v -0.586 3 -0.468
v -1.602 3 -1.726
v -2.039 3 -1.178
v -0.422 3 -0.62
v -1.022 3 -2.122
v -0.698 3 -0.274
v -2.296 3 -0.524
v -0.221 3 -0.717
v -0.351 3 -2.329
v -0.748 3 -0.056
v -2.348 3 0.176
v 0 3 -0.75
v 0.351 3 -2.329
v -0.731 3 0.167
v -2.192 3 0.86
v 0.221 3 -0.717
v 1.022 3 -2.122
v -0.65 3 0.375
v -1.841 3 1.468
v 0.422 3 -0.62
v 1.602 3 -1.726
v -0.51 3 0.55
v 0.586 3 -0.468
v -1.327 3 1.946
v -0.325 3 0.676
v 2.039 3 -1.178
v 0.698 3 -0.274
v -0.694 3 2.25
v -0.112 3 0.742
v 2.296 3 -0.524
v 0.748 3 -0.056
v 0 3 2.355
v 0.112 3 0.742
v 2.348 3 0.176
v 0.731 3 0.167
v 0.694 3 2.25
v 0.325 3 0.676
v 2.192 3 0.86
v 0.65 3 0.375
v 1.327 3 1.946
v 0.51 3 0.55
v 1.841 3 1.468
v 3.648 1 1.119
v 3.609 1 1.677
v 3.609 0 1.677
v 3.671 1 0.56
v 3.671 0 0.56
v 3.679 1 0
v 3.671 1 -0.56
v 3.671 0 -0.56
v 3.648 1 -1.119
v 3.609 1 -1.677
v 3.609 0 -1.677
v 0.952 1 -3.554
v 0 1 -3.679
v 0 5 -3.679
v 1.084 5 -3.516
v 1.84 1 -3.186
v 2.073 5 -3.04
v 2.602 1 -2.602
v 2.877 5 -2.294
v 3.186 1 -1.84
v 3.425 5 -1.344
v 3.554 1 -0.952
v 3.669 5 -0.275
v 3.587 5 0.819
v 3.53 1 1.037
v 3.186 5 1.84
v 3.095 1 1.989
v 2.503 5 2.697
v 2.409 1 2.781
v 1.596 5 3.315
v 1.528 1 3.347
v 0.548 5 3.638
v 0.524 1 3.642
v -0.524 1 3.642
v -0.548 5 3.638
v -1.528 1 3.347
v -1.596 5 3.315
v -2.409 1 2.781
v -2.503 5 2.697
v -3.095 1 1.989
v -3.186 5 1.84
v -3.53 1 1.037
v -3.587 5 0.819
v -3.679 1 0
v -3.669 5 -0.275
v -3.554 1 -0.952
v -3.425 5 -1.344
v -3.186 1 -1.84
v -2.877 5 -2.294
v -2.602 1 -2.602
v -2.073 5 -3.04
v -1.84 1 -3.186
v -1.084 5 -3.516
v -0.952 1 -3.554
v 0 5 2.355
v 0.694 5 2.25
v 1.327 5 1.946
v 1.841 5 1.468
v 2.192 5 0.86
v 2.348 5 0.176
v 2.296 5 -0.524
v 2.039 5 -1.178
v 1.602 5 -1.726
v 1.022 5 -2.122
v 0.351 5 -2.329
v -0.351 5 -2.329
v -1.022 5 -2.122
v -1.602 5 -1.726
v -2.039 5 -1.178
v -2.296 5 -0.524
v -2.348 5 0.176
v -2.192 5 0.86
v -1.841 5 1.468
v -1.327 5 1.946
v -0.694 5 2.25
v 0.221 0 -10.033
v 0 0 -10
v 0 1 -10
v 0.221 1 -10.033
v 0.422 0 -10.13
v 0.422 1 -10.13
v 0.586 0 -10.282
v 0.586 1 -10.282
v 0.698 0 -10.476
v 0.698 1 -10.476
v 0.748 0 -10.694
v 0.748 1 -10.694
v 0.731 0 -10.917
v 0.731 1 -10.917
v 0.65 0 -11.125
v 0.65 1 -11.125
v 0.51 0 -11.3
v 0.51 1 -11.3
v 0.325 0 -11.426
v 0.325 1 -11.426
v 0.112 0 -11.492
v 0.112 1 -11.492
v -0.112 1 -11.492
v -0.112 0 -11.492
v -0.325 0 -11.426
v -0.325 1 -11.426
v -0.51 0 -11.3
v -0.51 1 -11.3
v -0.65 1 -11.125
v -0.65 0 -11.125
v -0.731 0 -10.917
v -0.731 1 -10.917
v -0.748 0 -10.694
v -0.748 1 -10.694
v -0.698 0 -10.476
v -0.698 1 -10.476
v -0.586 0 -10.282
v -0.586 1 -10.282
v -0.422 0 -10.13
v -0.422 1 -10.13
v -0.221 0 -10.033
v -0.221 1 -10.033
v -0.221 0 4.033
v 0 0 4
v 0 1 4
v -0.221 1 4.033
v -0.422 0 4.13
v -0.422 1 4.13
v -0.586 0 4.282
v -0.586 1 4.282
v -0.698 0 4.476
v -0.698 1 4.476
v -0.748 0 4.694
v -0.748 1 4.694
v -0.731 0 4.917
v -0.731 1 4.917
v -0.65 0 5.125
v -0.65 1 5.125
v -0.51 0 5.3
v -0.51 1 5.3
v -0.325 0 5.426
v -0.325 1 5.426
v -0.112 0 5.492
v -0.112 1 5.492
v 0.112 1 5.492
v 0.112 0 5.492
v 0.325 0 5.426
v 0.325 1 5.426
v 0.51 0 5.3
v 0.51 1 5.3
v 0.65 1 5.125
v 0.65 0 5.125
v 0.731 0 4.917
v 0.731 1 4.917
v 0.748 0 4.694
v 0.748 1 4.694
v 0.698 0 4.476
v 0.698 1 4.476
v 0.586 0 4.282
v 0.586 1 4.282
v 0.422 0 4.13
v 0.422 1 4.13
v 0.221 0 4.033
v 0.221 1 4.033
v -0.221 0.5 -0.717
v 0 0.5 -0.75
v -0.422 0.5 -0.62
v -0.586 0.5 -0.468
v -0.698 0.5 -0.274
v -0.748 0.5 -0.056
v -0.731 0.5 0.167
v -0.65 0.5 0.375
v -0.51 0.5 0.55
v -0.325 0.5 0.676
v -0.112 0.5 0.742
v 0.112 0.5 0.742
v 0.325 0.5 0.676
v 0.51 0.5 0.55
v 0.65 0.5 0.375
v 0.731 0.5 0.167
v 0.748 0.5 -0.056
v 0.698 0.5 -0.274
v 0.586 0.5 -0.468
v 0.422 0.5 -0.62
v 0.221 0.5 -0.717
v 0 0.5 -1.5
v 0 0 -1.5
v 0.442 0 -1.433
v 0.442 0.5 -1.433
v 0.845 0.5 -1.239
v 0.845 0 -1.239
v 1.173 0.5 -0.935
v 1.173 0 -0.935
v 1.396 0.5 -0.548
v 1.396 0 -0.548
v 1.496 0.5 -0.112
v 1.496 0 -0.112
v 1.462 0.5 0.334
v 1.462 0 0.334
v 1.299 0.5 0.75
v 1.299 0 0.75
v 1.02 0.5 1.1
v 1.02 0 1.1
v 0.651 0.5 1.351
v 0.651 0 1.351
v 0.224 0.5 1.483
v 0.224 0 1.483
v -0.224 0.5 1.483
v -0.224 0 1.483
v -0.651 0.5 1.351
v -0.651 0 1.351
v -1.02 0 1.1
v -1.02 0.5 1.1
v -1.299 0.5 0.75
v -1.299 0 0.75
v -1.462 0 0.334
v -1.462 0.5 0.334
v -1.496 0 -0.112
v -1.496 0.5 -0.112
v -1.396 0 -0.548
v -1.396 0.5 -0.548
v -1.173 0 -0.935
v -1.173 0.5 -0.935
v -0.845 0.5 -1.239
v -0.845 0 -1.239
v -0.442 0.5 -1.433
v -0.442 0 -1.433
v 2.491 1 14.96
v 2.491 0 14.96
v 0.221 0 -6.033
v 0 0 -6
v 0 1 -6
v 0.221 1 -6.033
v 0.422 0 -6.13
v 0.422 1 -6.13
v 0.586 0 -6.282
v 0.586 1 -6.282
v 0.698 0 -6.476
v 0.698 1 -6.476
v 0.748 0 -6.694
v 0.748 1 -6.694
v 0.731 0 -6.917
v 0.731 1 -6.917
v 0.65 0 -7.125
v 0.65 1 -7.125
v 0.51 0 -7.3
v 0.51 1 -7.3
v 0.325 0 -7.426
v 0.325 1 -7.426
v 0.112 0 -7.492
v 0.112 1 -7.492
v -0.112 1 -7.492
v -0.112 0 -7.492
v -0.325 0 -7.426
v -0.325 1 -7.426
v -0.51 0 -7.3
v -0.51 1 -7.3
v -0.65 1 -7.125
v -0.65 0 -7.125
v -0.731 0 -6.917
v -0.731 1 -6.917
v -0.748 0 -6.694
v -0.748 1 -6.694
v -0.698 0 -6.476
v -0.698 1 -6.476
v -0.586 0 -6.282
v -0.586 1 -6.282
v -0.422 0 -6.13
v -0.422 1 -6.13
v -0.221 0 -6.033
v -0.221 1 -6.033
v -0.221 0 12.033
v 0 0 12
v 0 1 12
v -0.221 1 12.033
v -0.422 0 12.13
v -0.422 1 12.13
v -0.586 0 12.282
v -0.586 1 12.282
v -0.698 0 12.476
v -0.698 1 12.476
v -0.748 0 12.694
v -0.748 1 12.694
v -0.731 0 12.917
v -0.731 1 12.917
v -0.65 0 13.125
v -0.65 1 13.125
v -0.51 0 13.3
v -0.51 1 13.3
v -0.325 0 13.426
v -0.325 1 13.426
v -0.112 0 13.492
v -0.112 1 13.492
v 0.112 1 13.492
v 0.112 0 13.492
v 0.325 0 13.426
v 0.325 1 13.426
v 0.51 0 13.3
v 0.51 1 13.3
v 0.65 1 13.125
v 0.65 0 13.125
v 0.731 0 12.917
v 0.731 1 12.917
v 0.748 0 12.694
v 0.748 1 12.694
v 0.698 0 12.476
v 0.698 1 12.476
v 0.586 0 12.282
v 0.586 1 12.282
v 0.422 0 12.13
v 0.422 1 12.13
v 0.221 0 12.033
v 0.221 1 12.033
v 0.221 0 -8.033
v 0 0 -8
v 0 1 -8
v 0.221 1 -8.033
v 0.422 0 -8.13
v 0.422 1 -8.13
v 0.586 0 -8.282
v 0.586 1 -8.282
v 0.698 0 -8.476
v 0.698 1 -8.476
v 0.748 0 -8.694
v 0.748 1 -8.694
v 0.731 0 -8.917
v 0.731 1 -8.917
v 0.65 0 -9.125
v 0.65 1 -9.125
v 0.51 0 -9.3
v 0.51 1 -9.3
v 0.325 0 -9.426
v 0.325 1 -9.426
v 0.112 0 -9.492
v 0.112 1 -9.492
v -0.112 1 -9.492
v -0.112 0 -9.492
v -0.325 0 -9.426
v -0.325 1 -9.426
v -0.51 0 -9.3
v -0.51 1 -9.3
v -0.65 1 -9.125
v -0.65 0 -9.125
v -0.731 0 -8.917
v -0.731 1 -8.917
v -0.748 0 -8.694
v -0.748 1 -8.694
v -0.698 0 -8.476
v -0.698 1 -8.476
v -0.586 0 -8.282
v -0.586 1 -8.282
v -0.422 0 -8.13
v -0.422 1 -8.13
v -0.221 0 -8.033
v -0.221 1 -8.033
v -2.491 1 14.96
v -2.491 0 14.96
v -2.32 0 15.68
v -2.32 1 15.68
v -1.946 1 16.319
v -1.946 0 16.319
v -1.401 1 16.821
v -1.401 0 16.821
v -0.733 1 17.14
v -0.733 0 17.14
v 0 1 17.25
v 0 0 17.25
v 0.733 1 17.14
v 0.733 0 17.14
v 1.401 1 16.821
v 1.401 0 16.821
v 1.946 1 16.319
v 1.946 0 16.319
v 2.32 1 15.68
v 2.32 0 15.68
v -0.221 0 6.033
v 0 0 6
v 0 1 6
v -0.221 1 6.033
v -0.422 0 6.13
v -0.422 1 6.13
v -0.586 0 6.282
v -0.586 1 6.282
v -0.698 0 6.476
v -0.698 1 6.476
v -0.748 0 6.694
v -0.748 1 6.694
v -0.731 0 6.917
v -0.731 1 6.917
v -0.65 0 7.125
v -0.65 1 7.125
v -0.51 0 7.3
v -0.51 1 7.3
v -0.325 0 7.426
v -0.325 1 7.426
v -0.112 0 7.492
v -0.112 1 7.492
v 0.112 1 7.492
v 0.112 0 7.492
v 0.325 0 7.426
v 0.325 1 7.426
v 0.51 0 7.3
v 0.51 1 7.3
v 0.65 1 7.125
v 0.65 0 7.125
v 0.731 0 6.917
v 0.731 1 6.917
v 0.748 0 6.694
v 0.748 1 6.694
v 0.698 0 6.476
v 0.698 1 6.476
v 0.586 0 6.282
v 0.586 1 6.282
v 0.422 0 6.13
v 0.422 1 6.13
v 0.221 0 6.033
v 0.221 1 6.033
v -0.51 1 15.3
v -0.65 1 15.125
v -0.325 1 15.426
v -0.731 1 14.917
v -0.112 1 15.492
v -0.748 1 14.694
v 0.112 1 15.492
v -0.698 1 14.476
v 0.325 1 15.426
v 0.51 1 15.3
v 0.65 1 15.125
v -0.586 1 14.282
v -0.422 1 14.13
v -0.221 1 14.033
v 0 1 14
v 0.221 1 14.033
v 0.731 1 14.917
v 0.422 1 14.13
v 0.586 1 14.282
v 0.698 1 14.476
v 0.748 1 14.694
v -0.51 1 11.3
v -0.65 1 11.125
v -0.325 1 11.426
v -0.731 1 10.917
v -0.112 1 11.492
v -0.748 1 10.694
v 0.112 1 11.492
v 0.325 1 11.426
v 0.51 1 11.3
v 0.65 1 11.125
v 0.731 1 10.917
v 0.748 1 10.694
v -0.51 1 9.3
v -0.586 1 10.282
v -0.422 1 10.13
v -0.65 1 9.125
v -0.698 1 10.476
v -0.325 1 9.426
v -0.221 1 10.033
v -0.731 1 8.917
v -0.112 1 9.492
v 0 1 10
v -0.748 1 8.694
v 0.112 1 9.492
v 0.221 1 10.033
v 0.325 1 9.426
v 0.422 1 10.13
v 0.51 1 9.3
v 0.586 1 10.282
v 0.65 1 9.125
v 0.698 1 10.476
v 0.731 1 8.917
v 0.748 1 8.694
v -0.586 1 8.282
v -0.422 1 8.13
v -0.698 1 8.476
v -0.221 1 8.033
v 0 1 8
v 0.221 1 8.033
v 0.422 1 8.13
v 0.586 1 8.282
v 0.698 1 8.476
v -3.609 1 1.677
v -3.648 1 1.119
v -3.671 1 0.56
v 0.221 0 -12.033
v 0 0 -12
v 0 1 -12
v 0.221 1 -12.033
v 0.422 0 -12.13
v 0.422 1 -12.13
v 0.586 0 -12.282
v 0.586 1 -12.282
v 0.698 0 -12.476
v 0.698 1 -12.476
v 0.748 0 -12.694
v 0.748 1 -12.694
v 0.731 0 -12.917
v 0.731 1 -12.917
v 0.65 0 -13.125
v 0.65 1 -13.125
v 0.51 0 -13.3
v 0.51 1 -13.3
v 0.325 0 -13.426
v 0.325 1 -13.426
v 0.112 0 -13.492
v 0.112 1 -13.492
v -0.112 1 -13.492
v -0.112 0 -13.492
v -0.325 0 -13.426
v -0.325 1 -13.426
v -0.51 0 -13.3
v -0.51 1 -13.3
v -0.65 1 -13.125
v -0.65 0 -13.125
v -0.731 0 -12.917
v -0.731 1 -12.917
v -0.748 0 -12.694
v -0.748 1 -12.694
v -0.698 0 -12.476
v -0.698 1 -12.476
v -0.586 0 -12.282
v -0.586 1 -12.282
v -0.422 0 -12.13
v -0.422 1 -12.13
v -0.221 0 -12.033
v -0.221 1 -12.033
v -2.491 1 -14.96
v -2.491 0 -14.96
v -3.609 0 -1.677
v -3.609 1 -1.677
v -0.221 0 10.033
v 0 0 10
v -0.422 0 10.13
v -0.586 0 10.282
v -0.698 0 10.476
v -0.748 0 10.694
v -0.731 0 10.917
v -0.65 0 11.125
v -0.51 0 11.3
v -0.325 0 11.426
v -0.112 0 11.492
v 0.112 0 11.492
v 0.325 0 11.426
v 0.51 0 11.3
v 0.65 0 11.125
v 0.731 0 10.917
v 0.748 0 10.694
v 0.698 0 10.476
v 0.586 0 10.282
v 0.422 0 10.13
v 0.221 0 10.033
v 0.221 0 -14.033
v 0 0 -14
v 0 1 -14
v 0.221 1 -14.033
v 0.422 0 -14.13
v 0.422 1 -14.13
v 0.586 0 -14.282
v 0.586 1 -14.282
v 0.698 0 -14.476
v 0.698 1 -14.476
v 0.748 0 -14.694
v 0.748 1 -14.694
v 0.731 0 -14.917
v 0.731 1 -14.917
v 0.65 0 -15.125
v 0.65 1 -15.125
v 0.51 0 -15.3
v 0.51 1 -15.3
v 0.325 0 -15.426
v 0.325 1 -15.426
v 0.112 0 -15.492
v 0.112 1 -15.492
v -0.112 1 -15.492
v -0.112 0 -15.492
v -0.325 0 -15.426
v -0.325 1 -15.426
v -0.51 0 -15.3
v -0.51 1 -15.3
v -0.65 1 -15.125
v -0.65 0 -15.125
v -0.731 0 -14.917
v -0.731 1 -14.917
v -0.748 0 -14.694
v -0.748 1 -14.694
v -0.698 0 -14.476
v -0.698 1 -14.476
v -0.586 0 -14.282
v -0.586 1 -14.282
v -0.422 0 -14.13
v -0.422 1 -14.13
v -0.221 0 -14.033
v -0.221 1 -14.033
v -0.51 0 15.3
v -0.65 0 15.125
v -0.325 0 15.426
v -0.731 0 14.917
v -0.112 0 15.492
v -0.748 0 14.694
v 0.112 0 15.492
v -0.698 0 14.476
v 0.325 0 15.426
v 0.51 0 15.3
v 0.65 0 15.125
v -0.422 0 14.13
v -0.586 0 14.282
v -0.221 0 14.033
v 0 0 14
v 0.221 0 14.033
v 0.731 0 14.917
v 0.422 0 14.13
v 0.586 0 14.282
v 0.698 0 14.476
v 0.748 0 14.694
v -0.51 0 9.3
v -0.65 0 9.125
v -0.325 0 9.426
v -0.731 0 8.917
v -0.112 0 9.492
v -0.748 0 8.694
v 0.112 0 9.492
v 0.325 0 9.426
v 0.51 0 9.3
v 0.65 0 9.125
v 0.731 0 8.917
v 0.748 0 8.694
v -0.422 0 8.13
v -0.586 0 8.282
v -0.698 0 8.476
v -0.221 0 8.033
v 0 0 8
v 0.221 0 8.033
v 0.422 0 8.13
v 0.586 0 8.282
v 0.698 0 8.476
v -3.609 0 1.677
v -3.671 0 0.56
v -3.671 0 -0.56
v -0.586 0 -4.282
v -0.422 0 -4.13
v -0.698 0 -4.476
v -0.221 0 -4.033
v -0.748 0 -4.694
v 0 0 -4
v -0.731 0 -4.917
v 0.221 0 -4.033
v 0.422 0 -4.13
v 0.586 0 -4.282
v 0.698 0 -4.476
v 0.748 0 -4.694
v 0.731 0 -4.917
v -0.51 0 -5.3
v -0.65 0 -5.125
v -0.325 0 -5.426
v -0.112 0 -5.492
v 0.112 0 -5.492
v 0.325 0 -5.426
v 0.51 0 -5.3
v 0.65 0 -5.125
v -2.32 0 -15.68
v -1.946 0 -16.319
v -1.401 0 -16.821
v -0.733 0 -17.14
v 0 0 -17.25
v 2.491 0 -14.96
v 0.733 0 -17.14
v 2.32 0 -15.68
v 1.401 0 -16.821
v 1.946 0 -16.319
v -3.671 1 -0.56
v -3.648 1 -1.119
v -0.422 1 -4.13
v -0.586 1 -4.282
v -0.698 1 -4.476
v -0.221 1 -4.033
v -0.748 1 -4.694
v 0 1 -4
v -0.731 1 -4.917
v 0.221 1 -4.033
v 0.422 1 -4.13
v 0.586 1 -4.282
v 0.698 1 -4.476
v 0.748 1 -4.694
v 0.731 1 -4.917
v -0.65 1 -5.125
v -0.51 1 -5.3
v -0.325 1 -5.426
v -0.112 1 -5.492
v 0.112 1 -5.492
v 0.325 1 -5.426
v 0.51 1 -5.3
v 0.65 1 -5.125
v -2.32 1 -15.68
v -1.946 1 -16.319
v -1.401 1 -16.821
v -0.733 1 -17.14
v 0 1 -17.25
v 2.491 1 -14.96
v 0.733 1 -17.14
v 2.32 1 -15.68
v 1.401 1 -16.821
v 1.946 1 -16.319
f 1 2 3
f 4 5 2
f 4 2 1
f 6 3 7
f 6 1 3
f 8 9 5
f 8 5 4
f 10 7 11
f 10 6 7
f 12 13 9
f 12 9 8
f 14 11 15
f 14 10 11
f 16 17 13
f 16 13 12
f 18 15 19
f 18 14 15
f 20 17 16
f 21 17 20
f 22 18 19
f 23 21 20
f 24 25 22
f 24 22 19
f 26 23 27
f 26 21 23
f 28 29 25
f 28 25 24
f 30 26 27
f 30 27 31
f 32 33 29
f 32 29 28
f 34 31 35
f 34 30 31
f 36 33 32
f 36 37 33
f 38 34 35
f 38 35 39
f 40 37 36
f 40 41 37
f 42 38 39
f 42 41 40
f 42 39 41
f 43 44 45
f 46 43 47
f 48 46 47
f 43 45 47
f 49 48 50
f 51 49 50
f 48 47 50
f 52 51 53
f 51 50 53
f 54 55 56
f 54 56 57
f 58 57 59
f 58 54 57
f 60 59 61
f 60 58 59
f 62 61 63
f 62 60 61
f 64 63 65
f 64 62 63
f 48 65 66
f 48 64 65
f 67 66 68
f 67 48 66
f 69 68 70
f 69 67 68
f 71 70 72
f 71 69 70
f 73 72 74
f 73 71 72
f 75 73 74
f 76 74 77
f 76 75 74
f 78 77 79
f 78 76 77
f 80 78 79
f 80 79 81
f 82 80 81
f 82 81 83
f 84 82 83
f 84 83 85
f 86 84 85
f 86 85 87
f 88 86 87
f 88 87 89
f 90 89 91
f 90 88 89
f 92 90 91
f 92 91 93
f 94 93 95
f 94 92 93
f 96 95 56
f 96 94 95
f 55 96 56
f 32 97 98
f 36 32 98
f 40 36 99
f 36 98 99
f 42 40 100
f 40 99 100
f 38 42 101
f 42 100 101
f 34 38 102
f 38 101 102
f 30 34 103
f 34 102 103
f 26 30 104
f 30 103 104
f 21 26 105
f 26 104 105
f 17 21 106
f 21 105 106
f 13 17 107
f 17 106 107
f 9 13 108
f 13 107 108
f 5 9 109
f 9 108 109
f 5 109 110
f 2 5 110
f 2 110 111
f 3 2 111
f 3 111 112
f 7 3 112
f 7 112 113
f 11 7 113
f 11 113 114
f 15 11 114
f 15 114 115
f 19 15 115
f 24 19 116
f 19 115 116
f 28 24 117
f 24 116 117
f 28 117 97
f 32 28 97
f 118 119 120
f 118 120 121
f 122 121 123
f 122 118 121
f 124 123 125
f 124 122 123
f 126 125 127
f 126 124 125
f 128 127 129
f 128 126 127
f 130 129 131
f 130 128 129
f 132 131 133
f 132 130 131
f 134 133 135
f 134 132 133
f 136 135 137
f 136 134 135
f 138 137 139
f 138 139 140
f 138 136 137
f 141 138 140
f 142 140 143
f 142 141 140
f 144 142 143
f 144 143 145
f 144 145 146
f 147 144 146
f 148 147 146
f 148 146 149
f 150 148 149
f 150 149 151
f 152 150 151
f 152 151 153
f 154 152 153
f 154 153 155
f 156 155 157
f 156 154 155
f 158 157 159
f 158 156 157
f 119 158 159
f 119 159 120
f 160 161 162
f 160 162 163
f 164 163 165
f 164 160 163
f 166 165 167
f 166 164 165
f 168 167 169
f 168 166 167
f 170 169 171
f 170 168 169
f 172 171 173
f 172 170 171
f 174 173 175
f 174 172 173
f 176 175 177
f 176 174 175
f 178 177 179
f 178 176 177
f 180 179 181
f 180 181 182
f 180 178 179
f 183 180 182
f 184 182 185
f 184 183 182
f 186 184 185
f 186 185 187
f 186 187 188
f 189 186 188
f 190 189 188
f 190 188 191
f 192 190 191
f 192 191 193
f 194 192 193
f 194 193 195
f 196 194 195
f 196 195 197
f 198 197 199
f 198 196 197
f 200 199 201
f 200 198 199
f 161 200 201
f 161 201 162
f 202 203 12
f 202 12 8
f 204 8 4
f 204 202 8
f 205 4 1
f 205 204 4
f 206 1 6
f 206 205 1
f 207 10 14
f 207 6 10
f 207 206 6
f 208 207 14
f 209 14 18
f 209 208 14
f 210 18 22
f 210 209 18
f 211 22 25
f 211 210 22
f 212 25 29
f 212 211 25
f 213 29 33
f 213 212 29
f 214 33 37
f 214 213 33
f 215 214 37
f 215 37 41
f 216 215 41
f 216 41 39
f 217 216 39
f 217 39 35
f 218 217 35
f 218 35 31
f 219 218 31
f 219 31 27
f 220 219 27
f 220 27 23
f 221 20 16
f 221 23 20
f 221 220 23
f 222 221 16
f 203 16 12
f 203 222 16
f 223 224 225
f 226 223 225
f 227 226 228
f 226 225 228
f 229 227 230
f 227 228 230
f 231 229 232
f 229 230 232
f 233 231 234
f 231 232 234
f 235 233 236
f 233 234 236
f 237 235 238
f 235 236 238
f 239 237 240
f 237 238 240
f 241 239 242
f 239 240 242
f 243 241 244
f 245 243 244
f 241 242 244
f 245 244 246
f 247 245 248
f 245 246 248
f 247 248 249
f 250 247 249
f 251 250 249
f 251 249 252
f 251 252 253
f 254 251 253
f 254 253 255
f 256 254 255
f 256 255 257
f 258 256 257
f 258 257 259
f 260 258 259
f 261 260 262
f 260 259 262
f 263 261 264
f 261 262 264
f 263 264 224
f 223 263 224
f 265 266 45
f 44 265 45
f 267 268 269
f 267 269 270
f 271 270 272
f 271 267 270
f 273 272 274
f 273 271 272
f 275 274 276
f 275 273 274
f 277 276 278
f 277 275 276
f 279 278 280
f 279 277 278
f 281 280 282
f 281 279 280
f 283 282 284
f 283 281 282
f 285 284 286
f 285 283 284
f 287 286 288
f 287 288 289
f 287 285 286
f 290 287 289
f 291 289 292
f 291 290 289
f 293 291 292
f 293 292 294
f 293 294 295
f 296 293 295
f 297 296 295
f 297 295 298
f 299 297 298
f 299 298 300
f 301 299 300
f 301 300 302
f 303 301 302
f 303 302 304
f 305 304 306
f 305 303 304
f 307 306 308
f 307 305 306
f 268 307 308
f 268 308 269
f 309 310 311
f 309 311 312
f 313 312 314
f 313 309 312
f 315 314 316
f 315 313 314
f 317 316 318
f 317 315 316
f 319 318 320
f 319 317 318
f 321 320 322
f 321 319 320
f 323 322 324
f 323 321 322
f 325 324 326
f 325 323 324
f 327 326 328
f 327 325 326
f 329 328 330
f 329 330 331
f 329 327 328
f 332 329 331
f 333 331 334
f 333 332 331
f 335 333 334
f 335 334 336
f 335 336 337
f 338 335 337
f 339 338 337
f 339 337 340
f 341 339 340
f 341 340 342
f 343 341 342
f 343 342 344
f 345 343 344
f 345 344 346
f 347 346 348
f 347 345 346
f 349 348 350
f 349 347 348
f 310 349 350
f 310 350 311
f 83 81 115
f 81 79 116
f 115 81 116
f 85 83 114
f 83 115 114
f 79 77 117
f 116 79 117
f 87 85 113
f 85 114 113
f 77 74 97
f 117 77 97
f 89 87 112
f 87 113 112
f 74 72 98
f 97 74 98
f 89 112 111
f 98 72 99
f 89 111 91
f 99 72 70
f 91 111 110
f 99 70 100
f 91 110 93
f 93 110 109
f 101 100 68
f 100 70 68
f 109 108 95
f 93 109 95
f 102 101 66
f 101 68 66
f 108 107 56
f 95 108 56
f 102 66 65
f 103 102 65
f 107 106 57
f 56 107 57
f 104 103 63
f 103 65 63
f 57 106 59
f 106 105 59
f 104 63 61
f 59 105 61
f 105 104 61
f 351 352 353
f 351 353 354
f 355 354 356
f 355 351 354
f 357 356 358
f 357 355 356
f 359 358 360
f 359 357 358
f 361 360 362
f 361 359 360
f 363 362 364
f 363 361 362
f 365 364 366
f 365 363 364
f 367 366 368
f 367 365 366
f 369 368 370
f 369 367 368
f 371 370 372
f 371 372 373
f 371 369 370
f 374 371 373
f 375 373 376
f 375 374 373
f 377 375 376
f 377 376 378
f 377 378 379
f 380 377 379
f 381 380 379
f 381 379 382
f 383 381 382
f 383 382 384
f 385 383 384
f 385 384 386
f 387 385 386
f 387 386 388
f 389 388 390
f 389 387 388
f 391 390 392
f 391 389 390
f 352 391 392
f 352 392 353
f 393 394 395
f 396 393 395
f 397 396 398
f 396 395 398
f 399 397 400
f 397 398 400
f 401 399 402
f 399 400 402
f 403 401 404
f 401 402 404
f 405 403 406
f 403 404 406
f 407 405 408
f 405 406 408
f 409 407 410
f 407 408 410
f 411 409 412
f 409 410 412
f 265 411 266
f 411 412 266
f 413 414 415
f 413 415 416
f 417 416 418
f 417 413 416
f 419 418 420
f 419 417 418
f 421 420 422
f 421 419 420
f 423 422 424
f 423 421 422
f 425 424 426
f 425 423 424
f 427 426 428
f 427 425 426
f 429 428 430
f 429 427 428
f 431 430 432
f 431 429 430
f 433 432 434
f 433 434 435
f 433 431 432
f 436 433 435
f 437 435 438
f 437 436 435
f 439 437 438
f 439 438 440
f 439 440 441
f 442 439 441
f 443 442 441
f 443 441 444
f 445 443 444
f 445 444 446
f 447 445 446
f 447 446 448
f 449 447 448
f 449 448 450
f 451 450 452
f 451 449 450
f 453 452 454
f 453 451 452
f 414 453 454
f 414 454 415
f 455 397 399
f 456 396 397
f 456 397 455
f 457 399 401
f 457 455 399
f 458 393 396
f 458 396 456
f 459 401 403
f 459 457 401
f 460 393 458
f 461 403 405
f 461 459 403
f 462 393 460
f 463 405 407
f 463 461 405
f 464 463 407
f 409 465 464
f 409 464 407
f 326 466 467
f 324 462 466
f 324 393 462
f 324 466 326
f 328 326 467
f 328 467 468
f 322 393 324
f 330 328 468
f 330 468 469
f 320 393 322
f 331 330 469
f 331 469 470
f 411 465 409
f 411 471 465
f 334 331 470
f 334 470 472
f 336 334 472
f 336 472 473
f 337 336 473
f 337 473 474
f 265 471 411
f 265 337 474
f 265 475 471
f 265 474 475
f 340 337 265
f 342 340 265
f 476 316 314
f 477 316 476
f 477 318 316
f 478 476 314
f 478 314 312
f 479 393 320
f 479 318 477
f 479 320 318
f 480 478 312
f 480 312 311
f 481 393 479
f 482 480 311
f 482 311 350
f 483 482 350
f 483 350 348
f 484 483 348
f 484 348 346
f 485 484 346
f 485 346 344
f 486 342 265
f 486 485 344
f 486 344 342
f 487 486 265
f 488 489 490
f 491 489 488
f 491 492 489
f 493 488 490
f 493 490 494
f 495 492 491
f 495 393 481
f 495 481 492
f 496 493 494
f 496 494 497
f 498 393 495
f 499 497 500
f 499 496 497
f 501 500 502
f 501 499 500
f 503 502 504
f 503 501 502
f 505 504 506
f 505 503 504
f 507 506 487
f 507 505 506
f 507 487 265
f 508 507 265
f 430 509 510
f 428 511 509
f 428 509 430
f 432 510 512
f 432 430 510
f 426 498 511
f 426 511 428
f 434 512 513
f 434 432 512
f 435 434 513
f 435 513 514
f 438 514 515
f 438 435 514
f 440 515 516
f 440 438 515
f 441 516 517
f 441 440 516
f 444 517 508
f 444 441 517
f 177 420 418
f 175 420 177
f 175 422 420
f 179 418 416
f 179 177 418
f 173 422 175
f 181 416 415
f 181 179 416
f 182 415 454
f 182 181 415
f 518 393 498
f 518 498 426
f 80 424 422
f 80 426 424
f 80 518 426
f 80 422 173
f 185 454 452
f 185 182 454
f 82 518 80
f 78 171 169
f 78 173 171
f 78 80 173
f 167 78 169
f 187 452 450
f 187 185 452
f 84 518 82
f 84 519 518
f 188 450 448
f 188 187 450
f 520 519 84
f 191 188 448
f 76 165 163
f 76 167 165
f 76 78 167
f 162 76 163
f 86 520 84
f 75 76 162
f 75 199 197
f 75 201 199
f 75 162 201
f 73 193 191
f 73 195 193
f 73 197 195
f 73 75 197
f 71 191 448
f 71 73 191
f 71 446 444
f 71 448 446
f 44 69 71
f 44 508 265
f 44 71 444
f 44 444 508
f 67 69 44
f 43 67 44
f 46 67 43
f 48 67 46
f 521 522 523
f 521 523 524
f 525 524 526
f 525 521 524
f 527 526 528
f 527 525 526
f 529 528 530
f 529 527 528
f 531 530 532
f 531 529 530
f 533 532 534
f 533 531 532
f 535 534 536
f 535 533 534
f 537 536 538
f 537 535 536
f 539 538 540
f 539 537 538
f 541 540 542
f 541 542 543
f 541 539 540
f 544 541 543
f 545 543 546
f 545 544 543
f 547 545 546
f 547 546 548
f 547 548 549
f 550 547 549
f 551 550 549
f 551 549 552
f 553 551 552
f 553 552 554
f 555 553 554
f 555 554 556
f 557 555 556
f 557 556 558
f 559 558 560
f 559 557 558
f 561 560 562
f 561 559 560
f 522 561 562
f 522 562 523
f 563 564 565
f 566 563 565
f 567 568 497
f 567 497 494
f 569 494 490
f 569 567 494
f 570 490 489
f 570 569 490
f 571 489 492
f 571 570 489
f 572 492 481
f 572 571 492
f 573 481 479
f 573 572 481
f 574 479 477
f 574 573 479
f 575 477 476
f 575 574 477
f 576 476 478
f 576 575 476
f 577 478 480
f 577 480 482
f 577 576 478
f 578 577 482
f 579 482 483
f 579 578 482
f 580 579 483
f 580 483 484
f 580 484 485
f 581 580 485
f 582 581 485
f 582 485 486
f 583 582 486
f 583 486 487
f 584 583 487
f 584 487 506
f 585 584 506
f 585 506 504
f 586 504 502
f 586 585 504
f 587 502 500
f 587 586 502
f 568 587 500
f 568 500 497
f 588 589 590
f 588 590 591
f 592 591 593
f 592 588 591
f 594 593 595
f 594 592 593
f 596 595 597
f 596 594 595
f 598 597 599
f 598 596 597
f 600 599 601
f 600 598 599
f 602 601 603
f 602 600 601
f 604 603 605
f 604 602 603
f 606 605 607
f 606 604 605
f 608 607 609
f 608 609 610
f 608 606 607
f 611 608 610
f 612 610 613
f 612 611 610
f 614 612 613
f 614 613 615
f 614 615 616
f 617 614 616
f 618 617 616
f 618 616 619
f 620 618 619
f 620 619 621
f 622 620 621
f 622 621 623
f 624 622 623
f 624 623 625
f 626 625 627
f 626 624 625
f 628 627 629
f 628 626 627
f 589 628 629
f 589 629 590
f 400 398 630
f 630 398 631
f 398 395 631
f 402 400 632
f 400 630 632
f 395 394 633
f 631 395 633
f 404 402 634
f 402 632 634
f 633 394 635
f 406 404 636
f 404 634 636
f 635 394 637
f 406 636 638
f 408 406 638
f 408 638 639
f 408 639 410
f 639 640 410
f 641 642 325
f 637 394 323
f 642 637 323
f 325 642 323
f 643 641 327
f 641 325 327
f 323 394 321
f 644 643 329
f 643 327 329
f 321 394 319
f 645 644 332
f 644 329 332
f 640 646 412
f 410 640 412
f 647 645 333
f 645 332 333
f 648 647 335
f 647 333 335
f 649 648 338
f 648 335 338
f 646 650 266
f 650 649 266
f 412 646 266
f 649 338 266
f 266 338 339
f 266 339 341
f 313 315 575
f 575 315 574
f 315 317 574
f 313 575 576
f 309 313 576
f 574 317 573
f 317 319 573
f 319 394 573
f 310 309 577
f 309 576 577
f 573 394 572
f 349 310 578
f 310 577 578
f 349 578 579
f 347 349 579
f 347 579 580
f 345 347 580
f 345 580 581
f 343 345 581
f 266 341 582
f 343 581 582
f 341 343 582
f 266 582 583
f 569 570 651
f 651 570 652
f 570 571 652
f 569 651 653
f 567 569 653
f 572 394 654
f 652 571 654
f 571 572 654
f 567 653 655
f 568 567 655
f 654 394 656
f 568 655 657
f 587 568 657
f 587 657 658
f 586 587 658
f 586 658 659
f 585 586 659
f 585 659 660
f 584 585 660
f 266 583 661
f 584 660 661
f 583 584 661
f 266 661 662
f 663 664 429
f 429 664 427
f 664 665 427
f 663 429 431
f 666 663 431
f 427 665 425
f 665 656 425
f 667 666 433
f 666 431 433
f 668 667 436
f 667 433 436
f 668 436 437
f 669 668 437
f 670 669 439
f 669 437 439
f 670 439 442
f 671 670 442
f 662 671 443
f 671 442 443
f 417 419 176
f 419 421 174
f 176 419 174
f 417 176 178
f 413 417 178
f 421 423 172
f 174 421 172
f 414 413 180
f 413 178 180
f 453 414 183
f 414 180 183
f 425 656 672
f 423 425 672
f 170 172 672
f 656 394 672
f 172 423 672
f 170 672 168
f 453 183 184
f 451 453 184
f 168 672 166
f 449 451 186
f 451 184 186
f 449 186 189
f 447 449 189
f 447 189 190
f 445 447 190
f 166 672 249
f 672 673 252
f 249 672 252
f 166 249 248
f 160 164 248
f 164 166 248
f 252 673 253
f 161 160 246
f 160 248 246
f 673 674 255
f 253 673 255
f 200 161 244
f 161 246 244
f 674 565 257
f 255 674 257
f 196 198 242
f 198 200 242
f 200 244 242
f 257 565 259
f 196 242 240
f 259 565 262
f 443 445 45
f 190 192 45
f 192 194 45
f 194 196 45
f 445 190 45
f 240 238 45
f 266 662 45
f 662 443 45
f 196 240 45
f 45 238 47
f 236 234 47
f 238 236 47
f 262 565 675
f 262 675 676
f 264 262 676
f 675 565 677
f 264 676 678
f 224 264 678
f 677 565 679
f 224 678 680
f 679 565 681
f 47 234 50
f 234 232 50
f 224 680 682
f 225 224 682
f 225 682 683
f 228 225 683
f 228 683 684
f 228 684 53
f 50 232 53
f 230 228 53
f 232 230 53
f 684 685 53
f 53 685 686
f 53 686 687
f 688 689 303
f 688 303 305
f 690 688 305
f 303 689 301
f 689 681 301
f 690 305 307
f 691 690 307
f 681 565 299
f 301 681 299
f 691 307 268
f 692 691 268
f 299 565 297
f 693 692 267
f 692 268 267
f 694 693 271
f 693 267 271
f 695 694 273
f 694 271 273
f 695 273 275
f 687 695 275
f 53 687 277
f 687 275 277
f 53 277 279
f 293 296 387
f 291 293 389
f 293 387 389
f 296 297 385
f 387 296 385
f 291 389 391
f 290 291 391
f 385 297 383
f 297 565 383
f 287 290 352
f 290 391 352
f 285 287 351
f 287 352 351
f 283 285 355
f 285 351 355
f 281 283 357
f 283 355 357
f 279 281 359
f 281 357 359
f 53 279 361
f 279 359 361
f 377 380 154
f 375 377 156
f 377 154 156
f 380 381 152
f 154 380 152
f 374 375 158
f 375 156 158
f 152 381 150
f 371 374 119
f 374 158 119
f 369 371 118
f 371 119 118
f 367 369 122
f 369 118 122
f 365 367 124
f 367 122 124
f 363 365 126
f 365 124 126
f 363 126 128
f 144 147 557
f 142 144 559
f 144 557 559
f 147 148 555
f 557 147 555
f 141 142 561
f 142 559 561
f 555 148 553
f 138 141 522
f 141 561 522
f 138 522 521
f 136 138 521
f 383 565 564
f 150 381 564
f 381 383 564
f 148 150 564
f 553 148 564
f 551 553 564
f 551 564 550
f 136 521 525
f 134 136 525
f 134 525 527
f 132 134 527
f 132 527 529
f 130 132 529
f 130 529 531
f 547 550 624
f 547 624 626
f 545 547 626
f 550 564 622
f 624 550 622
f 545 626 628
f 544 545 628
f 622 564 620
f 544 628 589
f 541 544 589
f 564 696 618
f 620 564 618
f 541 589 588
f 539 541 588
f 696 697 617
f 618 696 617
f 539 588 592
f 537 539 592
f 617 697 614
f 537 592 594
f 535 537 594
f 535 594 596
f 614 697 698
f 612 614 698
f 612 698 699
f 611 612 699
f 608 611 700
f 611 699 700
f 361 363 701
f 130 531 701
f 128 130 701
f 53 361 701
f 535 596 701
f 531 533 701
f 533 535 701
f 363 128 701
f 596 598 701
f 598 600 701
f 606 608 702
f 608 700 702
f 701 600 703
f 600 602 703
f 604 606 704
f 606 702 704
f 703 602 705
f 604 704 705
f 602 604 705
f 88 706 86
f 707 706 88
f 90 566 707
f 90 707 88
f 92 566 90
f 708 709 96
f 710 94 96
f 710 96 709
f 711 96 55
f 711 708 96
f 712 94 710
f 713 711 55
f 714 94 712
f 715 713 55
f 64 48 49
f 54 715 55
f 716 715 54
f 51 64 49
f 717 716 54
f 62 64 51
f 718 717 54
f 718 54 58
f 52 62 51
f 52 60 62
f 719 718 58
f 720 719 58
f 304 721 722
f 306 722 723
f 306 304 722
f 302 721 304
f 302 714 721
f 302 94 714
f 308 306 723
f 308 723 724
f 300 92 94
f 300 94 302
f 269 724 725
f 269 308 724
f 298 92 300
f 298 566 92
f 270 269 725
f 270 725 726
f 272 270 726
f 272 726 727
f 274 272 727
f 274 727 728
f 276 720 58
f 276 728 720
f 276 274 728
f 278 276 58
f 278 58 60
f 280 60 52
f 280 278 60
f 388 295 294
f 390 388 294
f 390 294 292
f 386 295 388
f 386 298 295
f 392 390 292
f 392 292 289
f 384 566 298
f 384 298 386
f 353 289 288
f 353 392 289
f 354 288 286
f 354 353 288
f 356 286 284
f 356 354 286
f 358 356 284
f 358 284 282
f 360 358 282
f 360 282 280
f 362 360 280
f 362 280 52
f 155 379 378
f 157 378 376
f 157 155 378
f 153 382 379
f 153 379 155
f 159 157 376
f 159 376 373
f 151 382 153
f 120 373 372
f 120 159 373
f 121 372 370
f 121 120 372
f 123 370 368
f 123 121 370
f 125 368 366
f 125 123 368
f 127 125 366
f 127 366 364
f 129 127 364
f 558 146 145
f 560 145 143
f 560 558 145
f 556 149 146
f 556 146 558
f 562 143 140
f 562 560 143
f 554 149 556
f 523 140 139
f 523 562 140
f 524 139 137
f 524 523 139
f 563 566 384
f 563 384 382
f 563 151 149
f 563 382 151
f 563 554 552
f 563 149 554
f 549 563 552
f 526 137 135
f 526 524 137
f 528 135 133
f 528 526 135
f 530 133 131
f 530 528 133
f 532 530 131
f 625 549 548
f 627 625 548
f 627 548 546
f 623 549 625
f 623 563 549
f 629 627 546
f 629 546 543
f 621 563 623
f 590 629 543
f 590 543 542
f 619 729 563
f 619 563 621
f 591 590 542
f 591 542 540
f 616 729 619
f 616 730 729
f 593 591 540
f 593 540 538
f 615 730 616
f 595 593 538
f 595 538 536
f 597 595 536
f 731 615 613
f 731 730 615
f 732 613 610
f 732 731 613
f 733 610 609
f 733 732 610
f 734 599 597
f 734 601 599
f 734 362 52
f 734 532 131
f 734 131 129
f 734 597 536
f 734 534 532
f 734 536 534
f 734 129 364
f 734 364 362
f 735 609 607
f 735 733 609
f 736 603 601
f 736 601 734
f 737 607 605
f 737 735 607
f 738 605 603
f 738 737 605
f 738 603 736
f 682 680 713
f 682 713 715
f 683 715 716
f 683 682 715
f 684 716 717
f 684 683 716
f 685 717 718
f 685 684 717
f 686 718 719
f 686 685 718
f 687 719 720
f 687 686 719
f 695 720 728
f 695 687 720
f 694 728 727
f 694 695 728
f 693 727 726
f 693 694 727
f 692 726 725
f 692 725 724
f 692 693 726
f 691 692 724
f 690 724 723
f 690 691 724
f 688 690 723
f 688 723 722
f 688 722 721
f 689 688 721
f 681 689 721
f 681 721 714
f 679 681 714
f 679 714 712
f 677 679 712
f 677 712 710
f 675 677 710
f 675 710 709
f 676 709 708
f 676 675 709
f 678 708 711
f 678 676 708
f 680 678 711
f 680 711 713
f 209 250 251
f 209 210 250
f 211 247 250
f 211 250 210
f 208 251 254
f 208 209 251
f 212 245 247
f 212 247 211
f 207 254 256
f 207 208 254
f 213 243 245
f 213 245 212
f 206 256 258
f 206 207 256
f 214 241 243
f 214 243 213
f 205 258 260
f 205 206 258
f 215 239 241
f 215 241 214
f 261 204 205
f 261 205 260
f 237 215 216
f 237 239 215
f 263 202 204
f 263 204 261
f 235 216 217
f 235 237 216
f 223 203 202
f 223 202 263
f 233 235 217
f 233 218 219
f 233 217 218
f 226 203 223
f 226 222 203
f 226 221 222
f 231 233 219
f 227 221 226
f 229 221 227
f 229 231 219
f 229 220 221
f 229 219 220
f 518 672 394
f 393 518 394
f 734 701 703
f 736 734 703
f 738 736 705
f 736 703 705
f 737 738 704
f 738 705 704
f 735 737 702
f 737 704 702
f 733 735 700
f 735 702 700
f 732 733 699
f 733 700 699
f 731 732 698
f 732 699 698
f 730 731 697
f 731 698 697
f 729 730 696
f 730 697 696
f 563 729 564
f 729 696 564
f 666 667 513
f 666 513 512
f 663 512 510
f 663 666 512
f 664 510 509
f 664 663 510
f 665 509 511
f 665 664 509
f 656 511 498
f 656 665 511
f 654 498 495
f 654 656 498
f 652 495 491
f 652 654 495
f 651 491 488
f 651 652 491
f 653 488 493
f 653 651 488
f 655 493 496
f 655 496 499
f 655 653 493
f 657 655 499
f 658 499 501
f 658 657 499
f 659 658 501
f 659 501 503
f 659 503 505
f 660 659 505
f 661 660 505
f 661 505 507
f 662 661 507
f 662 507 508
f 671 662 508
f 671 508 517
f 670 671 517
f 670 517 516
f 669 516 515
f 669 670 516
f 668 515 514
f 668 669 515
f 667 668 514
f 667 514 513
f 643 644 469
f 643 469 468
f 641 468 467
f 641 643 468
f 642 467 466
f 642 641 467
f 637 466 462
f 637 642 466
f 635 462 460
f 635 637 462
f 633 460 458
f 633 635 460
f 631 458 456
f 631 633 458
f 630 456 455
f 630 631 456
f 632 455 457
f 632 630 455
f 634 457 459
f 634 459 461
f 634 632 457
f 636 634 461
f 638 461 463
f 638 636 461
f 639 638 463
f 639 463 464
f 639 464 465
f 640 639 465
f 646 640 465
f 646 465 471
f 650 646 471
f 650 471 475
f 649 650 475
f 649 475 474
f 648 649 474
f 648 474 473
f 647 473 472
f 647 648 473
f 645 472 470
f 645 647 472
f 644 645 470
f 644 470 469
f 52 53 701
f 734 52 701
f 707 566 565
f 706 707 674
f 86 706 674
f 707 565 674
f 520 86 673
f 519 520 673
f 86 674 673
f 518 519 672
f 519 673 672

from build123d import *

# Parameters (mm, degrees)
SKETCH1_R           = 0.75
BOSS_EXTRUDE1_DEPTH = 1
SKETCH2_R           = 3.67931812
BOSS_EXTRUDE2_DEPTH = 5
SKETCH2_3_R         = 1.5
CUT_EXTRUDE1_DEPTH  = 0.5
SKETCH1_2_R         = 0.75
CUT_EXTRUDE2_DEPTH  = 19.333027078
SKETCH3_R           = 2.355
CUT_EXTRUDE3_DEPTH  = 2


with BuildPart() as part:
    # Sketch1 → Boss-Extrude1 (new body)
    with BuildSketch(Plane(origin=(0, 0, 0), x_dir=(1, 0, 0), z_dir=(0, 1, 0))):
        with BuildLine():
            Line((-2.49119588, 14.959626071), (-3.608885156, 1.677008569))
            ThreePointArc((-3.608885156, 1.677008569), (-3.67931812, 0), (-3.608885156, -1.677008569))
            Line((-3.608885156, -1.677008569), (-2.49119588, -14.959626071))
            ThreePointArc((-2.49119588, -14.959626071), (0, -17.25), (2.49119588, -14.959626071))
            Line((2.49119588, -14.959626071), (3.608885156, -1.677008569))
            ThreePointArc((3.608885156, -1.677008569), (3.67931812, 0), (3.608885156, 1.677008569))
            Line((3.608885156, 1.677008569), (2.49119588, 14.959626071))
            ThreePointArc((2.49119588, 14.959626071), (0, 17.25), (-2.49119588, 14.959626071))
        make_face()
        with Locations((0, 14.75)):
            Circle(SKETCH1_R, mode=Mode.SUBTRACT)
        with Locations((0, 12.75)):
            Circle(SKETCH1_R, mode=Mode.SUBTRACT)
        with Locations((0, 10.75)):
            Circle(SKETCH1_R, mode=Mode.SUBTRACT)
        with Locations((0, 8.75)):
            Circle(SKETCH1_R, mode=Mode.SUBTRACT)
        with Locations((0, 6.75)):
            Circle(SKETCH1_R, mode=Mode.SUBTRACT)
        with Locations((0, 4.75)):
            Circle(SKETCH1_R, mode=Mode.SUBTRACT)
        Circle(SKETCH1_R, mode=Mode.SUBTRACT)
        with Locations((0, -4.75)):
            Circle(SKETCH1_R, mode=Mode.SUBTRACT)
        with Locations((0, -6.75)):
            Circle(SKETCH1_R, mode=Mode.SUBTRACT)
        with Locations((0, -8.75)):
            Circle(SKETCH1_R, mode=Mode.SUBTRACT)
        with Locations((0, -10.75)):
            Circle(SKETCH1_R, mode=Mode.SUBTRACT)
        with Locations((0, -12.75)):
            Circle(SKETCH1_R, mode=Mode.SUBTRACT)
        with Locations((0, -14.75)):
            Circle(SKETCH1_R, mode=Mode.SUBTRACT)
    extrude(amount=BOSS_EXTRUDE1_DEPTH)

    # Sketch2 → Boss-Extrude2 (add)
    with BuildSketch(Plane.XZ):
        Circle(SKETCH2_R)
    extrude(amount=-BOSS_EXTRUDE2_DEPTH)

    # Sketch2<3> → Cut-Extrude1 (cut)
    with BuildSketch(Plane.XZ):
        Circle(SKETCH2_3_R)
    extrude(amount=-CUT_EXTRUDE1_DEPTH, mode=Mode.SUBTRACT)

    # Sketch1<2> → Cut-Extrude2 (cut, through all)
    with BuildSketch(Plane(origin=(0, 0, 0), x_dir=(1, 0, 0), z_dir=(0, 1, 0))):
        Circle(SKETCH1_2_R)
    extrude(amount=CUT_EXTRUDE2_DEPTH, mode=Mode.SUBTRACT)

    # Sketch3 → Cut-Extrude3 (cut)
    with BuildSketch(Plane(origin=(0, 5, 0), x_dir=(1, 0, 0), z_dir=(0, 1, 0))):
        Circle(SKETCH3_R)
    extrude(amount=-CUT_EXTRUDE3_DEPTH, mode=Mode.SUBTRACT)


solid = part.part
